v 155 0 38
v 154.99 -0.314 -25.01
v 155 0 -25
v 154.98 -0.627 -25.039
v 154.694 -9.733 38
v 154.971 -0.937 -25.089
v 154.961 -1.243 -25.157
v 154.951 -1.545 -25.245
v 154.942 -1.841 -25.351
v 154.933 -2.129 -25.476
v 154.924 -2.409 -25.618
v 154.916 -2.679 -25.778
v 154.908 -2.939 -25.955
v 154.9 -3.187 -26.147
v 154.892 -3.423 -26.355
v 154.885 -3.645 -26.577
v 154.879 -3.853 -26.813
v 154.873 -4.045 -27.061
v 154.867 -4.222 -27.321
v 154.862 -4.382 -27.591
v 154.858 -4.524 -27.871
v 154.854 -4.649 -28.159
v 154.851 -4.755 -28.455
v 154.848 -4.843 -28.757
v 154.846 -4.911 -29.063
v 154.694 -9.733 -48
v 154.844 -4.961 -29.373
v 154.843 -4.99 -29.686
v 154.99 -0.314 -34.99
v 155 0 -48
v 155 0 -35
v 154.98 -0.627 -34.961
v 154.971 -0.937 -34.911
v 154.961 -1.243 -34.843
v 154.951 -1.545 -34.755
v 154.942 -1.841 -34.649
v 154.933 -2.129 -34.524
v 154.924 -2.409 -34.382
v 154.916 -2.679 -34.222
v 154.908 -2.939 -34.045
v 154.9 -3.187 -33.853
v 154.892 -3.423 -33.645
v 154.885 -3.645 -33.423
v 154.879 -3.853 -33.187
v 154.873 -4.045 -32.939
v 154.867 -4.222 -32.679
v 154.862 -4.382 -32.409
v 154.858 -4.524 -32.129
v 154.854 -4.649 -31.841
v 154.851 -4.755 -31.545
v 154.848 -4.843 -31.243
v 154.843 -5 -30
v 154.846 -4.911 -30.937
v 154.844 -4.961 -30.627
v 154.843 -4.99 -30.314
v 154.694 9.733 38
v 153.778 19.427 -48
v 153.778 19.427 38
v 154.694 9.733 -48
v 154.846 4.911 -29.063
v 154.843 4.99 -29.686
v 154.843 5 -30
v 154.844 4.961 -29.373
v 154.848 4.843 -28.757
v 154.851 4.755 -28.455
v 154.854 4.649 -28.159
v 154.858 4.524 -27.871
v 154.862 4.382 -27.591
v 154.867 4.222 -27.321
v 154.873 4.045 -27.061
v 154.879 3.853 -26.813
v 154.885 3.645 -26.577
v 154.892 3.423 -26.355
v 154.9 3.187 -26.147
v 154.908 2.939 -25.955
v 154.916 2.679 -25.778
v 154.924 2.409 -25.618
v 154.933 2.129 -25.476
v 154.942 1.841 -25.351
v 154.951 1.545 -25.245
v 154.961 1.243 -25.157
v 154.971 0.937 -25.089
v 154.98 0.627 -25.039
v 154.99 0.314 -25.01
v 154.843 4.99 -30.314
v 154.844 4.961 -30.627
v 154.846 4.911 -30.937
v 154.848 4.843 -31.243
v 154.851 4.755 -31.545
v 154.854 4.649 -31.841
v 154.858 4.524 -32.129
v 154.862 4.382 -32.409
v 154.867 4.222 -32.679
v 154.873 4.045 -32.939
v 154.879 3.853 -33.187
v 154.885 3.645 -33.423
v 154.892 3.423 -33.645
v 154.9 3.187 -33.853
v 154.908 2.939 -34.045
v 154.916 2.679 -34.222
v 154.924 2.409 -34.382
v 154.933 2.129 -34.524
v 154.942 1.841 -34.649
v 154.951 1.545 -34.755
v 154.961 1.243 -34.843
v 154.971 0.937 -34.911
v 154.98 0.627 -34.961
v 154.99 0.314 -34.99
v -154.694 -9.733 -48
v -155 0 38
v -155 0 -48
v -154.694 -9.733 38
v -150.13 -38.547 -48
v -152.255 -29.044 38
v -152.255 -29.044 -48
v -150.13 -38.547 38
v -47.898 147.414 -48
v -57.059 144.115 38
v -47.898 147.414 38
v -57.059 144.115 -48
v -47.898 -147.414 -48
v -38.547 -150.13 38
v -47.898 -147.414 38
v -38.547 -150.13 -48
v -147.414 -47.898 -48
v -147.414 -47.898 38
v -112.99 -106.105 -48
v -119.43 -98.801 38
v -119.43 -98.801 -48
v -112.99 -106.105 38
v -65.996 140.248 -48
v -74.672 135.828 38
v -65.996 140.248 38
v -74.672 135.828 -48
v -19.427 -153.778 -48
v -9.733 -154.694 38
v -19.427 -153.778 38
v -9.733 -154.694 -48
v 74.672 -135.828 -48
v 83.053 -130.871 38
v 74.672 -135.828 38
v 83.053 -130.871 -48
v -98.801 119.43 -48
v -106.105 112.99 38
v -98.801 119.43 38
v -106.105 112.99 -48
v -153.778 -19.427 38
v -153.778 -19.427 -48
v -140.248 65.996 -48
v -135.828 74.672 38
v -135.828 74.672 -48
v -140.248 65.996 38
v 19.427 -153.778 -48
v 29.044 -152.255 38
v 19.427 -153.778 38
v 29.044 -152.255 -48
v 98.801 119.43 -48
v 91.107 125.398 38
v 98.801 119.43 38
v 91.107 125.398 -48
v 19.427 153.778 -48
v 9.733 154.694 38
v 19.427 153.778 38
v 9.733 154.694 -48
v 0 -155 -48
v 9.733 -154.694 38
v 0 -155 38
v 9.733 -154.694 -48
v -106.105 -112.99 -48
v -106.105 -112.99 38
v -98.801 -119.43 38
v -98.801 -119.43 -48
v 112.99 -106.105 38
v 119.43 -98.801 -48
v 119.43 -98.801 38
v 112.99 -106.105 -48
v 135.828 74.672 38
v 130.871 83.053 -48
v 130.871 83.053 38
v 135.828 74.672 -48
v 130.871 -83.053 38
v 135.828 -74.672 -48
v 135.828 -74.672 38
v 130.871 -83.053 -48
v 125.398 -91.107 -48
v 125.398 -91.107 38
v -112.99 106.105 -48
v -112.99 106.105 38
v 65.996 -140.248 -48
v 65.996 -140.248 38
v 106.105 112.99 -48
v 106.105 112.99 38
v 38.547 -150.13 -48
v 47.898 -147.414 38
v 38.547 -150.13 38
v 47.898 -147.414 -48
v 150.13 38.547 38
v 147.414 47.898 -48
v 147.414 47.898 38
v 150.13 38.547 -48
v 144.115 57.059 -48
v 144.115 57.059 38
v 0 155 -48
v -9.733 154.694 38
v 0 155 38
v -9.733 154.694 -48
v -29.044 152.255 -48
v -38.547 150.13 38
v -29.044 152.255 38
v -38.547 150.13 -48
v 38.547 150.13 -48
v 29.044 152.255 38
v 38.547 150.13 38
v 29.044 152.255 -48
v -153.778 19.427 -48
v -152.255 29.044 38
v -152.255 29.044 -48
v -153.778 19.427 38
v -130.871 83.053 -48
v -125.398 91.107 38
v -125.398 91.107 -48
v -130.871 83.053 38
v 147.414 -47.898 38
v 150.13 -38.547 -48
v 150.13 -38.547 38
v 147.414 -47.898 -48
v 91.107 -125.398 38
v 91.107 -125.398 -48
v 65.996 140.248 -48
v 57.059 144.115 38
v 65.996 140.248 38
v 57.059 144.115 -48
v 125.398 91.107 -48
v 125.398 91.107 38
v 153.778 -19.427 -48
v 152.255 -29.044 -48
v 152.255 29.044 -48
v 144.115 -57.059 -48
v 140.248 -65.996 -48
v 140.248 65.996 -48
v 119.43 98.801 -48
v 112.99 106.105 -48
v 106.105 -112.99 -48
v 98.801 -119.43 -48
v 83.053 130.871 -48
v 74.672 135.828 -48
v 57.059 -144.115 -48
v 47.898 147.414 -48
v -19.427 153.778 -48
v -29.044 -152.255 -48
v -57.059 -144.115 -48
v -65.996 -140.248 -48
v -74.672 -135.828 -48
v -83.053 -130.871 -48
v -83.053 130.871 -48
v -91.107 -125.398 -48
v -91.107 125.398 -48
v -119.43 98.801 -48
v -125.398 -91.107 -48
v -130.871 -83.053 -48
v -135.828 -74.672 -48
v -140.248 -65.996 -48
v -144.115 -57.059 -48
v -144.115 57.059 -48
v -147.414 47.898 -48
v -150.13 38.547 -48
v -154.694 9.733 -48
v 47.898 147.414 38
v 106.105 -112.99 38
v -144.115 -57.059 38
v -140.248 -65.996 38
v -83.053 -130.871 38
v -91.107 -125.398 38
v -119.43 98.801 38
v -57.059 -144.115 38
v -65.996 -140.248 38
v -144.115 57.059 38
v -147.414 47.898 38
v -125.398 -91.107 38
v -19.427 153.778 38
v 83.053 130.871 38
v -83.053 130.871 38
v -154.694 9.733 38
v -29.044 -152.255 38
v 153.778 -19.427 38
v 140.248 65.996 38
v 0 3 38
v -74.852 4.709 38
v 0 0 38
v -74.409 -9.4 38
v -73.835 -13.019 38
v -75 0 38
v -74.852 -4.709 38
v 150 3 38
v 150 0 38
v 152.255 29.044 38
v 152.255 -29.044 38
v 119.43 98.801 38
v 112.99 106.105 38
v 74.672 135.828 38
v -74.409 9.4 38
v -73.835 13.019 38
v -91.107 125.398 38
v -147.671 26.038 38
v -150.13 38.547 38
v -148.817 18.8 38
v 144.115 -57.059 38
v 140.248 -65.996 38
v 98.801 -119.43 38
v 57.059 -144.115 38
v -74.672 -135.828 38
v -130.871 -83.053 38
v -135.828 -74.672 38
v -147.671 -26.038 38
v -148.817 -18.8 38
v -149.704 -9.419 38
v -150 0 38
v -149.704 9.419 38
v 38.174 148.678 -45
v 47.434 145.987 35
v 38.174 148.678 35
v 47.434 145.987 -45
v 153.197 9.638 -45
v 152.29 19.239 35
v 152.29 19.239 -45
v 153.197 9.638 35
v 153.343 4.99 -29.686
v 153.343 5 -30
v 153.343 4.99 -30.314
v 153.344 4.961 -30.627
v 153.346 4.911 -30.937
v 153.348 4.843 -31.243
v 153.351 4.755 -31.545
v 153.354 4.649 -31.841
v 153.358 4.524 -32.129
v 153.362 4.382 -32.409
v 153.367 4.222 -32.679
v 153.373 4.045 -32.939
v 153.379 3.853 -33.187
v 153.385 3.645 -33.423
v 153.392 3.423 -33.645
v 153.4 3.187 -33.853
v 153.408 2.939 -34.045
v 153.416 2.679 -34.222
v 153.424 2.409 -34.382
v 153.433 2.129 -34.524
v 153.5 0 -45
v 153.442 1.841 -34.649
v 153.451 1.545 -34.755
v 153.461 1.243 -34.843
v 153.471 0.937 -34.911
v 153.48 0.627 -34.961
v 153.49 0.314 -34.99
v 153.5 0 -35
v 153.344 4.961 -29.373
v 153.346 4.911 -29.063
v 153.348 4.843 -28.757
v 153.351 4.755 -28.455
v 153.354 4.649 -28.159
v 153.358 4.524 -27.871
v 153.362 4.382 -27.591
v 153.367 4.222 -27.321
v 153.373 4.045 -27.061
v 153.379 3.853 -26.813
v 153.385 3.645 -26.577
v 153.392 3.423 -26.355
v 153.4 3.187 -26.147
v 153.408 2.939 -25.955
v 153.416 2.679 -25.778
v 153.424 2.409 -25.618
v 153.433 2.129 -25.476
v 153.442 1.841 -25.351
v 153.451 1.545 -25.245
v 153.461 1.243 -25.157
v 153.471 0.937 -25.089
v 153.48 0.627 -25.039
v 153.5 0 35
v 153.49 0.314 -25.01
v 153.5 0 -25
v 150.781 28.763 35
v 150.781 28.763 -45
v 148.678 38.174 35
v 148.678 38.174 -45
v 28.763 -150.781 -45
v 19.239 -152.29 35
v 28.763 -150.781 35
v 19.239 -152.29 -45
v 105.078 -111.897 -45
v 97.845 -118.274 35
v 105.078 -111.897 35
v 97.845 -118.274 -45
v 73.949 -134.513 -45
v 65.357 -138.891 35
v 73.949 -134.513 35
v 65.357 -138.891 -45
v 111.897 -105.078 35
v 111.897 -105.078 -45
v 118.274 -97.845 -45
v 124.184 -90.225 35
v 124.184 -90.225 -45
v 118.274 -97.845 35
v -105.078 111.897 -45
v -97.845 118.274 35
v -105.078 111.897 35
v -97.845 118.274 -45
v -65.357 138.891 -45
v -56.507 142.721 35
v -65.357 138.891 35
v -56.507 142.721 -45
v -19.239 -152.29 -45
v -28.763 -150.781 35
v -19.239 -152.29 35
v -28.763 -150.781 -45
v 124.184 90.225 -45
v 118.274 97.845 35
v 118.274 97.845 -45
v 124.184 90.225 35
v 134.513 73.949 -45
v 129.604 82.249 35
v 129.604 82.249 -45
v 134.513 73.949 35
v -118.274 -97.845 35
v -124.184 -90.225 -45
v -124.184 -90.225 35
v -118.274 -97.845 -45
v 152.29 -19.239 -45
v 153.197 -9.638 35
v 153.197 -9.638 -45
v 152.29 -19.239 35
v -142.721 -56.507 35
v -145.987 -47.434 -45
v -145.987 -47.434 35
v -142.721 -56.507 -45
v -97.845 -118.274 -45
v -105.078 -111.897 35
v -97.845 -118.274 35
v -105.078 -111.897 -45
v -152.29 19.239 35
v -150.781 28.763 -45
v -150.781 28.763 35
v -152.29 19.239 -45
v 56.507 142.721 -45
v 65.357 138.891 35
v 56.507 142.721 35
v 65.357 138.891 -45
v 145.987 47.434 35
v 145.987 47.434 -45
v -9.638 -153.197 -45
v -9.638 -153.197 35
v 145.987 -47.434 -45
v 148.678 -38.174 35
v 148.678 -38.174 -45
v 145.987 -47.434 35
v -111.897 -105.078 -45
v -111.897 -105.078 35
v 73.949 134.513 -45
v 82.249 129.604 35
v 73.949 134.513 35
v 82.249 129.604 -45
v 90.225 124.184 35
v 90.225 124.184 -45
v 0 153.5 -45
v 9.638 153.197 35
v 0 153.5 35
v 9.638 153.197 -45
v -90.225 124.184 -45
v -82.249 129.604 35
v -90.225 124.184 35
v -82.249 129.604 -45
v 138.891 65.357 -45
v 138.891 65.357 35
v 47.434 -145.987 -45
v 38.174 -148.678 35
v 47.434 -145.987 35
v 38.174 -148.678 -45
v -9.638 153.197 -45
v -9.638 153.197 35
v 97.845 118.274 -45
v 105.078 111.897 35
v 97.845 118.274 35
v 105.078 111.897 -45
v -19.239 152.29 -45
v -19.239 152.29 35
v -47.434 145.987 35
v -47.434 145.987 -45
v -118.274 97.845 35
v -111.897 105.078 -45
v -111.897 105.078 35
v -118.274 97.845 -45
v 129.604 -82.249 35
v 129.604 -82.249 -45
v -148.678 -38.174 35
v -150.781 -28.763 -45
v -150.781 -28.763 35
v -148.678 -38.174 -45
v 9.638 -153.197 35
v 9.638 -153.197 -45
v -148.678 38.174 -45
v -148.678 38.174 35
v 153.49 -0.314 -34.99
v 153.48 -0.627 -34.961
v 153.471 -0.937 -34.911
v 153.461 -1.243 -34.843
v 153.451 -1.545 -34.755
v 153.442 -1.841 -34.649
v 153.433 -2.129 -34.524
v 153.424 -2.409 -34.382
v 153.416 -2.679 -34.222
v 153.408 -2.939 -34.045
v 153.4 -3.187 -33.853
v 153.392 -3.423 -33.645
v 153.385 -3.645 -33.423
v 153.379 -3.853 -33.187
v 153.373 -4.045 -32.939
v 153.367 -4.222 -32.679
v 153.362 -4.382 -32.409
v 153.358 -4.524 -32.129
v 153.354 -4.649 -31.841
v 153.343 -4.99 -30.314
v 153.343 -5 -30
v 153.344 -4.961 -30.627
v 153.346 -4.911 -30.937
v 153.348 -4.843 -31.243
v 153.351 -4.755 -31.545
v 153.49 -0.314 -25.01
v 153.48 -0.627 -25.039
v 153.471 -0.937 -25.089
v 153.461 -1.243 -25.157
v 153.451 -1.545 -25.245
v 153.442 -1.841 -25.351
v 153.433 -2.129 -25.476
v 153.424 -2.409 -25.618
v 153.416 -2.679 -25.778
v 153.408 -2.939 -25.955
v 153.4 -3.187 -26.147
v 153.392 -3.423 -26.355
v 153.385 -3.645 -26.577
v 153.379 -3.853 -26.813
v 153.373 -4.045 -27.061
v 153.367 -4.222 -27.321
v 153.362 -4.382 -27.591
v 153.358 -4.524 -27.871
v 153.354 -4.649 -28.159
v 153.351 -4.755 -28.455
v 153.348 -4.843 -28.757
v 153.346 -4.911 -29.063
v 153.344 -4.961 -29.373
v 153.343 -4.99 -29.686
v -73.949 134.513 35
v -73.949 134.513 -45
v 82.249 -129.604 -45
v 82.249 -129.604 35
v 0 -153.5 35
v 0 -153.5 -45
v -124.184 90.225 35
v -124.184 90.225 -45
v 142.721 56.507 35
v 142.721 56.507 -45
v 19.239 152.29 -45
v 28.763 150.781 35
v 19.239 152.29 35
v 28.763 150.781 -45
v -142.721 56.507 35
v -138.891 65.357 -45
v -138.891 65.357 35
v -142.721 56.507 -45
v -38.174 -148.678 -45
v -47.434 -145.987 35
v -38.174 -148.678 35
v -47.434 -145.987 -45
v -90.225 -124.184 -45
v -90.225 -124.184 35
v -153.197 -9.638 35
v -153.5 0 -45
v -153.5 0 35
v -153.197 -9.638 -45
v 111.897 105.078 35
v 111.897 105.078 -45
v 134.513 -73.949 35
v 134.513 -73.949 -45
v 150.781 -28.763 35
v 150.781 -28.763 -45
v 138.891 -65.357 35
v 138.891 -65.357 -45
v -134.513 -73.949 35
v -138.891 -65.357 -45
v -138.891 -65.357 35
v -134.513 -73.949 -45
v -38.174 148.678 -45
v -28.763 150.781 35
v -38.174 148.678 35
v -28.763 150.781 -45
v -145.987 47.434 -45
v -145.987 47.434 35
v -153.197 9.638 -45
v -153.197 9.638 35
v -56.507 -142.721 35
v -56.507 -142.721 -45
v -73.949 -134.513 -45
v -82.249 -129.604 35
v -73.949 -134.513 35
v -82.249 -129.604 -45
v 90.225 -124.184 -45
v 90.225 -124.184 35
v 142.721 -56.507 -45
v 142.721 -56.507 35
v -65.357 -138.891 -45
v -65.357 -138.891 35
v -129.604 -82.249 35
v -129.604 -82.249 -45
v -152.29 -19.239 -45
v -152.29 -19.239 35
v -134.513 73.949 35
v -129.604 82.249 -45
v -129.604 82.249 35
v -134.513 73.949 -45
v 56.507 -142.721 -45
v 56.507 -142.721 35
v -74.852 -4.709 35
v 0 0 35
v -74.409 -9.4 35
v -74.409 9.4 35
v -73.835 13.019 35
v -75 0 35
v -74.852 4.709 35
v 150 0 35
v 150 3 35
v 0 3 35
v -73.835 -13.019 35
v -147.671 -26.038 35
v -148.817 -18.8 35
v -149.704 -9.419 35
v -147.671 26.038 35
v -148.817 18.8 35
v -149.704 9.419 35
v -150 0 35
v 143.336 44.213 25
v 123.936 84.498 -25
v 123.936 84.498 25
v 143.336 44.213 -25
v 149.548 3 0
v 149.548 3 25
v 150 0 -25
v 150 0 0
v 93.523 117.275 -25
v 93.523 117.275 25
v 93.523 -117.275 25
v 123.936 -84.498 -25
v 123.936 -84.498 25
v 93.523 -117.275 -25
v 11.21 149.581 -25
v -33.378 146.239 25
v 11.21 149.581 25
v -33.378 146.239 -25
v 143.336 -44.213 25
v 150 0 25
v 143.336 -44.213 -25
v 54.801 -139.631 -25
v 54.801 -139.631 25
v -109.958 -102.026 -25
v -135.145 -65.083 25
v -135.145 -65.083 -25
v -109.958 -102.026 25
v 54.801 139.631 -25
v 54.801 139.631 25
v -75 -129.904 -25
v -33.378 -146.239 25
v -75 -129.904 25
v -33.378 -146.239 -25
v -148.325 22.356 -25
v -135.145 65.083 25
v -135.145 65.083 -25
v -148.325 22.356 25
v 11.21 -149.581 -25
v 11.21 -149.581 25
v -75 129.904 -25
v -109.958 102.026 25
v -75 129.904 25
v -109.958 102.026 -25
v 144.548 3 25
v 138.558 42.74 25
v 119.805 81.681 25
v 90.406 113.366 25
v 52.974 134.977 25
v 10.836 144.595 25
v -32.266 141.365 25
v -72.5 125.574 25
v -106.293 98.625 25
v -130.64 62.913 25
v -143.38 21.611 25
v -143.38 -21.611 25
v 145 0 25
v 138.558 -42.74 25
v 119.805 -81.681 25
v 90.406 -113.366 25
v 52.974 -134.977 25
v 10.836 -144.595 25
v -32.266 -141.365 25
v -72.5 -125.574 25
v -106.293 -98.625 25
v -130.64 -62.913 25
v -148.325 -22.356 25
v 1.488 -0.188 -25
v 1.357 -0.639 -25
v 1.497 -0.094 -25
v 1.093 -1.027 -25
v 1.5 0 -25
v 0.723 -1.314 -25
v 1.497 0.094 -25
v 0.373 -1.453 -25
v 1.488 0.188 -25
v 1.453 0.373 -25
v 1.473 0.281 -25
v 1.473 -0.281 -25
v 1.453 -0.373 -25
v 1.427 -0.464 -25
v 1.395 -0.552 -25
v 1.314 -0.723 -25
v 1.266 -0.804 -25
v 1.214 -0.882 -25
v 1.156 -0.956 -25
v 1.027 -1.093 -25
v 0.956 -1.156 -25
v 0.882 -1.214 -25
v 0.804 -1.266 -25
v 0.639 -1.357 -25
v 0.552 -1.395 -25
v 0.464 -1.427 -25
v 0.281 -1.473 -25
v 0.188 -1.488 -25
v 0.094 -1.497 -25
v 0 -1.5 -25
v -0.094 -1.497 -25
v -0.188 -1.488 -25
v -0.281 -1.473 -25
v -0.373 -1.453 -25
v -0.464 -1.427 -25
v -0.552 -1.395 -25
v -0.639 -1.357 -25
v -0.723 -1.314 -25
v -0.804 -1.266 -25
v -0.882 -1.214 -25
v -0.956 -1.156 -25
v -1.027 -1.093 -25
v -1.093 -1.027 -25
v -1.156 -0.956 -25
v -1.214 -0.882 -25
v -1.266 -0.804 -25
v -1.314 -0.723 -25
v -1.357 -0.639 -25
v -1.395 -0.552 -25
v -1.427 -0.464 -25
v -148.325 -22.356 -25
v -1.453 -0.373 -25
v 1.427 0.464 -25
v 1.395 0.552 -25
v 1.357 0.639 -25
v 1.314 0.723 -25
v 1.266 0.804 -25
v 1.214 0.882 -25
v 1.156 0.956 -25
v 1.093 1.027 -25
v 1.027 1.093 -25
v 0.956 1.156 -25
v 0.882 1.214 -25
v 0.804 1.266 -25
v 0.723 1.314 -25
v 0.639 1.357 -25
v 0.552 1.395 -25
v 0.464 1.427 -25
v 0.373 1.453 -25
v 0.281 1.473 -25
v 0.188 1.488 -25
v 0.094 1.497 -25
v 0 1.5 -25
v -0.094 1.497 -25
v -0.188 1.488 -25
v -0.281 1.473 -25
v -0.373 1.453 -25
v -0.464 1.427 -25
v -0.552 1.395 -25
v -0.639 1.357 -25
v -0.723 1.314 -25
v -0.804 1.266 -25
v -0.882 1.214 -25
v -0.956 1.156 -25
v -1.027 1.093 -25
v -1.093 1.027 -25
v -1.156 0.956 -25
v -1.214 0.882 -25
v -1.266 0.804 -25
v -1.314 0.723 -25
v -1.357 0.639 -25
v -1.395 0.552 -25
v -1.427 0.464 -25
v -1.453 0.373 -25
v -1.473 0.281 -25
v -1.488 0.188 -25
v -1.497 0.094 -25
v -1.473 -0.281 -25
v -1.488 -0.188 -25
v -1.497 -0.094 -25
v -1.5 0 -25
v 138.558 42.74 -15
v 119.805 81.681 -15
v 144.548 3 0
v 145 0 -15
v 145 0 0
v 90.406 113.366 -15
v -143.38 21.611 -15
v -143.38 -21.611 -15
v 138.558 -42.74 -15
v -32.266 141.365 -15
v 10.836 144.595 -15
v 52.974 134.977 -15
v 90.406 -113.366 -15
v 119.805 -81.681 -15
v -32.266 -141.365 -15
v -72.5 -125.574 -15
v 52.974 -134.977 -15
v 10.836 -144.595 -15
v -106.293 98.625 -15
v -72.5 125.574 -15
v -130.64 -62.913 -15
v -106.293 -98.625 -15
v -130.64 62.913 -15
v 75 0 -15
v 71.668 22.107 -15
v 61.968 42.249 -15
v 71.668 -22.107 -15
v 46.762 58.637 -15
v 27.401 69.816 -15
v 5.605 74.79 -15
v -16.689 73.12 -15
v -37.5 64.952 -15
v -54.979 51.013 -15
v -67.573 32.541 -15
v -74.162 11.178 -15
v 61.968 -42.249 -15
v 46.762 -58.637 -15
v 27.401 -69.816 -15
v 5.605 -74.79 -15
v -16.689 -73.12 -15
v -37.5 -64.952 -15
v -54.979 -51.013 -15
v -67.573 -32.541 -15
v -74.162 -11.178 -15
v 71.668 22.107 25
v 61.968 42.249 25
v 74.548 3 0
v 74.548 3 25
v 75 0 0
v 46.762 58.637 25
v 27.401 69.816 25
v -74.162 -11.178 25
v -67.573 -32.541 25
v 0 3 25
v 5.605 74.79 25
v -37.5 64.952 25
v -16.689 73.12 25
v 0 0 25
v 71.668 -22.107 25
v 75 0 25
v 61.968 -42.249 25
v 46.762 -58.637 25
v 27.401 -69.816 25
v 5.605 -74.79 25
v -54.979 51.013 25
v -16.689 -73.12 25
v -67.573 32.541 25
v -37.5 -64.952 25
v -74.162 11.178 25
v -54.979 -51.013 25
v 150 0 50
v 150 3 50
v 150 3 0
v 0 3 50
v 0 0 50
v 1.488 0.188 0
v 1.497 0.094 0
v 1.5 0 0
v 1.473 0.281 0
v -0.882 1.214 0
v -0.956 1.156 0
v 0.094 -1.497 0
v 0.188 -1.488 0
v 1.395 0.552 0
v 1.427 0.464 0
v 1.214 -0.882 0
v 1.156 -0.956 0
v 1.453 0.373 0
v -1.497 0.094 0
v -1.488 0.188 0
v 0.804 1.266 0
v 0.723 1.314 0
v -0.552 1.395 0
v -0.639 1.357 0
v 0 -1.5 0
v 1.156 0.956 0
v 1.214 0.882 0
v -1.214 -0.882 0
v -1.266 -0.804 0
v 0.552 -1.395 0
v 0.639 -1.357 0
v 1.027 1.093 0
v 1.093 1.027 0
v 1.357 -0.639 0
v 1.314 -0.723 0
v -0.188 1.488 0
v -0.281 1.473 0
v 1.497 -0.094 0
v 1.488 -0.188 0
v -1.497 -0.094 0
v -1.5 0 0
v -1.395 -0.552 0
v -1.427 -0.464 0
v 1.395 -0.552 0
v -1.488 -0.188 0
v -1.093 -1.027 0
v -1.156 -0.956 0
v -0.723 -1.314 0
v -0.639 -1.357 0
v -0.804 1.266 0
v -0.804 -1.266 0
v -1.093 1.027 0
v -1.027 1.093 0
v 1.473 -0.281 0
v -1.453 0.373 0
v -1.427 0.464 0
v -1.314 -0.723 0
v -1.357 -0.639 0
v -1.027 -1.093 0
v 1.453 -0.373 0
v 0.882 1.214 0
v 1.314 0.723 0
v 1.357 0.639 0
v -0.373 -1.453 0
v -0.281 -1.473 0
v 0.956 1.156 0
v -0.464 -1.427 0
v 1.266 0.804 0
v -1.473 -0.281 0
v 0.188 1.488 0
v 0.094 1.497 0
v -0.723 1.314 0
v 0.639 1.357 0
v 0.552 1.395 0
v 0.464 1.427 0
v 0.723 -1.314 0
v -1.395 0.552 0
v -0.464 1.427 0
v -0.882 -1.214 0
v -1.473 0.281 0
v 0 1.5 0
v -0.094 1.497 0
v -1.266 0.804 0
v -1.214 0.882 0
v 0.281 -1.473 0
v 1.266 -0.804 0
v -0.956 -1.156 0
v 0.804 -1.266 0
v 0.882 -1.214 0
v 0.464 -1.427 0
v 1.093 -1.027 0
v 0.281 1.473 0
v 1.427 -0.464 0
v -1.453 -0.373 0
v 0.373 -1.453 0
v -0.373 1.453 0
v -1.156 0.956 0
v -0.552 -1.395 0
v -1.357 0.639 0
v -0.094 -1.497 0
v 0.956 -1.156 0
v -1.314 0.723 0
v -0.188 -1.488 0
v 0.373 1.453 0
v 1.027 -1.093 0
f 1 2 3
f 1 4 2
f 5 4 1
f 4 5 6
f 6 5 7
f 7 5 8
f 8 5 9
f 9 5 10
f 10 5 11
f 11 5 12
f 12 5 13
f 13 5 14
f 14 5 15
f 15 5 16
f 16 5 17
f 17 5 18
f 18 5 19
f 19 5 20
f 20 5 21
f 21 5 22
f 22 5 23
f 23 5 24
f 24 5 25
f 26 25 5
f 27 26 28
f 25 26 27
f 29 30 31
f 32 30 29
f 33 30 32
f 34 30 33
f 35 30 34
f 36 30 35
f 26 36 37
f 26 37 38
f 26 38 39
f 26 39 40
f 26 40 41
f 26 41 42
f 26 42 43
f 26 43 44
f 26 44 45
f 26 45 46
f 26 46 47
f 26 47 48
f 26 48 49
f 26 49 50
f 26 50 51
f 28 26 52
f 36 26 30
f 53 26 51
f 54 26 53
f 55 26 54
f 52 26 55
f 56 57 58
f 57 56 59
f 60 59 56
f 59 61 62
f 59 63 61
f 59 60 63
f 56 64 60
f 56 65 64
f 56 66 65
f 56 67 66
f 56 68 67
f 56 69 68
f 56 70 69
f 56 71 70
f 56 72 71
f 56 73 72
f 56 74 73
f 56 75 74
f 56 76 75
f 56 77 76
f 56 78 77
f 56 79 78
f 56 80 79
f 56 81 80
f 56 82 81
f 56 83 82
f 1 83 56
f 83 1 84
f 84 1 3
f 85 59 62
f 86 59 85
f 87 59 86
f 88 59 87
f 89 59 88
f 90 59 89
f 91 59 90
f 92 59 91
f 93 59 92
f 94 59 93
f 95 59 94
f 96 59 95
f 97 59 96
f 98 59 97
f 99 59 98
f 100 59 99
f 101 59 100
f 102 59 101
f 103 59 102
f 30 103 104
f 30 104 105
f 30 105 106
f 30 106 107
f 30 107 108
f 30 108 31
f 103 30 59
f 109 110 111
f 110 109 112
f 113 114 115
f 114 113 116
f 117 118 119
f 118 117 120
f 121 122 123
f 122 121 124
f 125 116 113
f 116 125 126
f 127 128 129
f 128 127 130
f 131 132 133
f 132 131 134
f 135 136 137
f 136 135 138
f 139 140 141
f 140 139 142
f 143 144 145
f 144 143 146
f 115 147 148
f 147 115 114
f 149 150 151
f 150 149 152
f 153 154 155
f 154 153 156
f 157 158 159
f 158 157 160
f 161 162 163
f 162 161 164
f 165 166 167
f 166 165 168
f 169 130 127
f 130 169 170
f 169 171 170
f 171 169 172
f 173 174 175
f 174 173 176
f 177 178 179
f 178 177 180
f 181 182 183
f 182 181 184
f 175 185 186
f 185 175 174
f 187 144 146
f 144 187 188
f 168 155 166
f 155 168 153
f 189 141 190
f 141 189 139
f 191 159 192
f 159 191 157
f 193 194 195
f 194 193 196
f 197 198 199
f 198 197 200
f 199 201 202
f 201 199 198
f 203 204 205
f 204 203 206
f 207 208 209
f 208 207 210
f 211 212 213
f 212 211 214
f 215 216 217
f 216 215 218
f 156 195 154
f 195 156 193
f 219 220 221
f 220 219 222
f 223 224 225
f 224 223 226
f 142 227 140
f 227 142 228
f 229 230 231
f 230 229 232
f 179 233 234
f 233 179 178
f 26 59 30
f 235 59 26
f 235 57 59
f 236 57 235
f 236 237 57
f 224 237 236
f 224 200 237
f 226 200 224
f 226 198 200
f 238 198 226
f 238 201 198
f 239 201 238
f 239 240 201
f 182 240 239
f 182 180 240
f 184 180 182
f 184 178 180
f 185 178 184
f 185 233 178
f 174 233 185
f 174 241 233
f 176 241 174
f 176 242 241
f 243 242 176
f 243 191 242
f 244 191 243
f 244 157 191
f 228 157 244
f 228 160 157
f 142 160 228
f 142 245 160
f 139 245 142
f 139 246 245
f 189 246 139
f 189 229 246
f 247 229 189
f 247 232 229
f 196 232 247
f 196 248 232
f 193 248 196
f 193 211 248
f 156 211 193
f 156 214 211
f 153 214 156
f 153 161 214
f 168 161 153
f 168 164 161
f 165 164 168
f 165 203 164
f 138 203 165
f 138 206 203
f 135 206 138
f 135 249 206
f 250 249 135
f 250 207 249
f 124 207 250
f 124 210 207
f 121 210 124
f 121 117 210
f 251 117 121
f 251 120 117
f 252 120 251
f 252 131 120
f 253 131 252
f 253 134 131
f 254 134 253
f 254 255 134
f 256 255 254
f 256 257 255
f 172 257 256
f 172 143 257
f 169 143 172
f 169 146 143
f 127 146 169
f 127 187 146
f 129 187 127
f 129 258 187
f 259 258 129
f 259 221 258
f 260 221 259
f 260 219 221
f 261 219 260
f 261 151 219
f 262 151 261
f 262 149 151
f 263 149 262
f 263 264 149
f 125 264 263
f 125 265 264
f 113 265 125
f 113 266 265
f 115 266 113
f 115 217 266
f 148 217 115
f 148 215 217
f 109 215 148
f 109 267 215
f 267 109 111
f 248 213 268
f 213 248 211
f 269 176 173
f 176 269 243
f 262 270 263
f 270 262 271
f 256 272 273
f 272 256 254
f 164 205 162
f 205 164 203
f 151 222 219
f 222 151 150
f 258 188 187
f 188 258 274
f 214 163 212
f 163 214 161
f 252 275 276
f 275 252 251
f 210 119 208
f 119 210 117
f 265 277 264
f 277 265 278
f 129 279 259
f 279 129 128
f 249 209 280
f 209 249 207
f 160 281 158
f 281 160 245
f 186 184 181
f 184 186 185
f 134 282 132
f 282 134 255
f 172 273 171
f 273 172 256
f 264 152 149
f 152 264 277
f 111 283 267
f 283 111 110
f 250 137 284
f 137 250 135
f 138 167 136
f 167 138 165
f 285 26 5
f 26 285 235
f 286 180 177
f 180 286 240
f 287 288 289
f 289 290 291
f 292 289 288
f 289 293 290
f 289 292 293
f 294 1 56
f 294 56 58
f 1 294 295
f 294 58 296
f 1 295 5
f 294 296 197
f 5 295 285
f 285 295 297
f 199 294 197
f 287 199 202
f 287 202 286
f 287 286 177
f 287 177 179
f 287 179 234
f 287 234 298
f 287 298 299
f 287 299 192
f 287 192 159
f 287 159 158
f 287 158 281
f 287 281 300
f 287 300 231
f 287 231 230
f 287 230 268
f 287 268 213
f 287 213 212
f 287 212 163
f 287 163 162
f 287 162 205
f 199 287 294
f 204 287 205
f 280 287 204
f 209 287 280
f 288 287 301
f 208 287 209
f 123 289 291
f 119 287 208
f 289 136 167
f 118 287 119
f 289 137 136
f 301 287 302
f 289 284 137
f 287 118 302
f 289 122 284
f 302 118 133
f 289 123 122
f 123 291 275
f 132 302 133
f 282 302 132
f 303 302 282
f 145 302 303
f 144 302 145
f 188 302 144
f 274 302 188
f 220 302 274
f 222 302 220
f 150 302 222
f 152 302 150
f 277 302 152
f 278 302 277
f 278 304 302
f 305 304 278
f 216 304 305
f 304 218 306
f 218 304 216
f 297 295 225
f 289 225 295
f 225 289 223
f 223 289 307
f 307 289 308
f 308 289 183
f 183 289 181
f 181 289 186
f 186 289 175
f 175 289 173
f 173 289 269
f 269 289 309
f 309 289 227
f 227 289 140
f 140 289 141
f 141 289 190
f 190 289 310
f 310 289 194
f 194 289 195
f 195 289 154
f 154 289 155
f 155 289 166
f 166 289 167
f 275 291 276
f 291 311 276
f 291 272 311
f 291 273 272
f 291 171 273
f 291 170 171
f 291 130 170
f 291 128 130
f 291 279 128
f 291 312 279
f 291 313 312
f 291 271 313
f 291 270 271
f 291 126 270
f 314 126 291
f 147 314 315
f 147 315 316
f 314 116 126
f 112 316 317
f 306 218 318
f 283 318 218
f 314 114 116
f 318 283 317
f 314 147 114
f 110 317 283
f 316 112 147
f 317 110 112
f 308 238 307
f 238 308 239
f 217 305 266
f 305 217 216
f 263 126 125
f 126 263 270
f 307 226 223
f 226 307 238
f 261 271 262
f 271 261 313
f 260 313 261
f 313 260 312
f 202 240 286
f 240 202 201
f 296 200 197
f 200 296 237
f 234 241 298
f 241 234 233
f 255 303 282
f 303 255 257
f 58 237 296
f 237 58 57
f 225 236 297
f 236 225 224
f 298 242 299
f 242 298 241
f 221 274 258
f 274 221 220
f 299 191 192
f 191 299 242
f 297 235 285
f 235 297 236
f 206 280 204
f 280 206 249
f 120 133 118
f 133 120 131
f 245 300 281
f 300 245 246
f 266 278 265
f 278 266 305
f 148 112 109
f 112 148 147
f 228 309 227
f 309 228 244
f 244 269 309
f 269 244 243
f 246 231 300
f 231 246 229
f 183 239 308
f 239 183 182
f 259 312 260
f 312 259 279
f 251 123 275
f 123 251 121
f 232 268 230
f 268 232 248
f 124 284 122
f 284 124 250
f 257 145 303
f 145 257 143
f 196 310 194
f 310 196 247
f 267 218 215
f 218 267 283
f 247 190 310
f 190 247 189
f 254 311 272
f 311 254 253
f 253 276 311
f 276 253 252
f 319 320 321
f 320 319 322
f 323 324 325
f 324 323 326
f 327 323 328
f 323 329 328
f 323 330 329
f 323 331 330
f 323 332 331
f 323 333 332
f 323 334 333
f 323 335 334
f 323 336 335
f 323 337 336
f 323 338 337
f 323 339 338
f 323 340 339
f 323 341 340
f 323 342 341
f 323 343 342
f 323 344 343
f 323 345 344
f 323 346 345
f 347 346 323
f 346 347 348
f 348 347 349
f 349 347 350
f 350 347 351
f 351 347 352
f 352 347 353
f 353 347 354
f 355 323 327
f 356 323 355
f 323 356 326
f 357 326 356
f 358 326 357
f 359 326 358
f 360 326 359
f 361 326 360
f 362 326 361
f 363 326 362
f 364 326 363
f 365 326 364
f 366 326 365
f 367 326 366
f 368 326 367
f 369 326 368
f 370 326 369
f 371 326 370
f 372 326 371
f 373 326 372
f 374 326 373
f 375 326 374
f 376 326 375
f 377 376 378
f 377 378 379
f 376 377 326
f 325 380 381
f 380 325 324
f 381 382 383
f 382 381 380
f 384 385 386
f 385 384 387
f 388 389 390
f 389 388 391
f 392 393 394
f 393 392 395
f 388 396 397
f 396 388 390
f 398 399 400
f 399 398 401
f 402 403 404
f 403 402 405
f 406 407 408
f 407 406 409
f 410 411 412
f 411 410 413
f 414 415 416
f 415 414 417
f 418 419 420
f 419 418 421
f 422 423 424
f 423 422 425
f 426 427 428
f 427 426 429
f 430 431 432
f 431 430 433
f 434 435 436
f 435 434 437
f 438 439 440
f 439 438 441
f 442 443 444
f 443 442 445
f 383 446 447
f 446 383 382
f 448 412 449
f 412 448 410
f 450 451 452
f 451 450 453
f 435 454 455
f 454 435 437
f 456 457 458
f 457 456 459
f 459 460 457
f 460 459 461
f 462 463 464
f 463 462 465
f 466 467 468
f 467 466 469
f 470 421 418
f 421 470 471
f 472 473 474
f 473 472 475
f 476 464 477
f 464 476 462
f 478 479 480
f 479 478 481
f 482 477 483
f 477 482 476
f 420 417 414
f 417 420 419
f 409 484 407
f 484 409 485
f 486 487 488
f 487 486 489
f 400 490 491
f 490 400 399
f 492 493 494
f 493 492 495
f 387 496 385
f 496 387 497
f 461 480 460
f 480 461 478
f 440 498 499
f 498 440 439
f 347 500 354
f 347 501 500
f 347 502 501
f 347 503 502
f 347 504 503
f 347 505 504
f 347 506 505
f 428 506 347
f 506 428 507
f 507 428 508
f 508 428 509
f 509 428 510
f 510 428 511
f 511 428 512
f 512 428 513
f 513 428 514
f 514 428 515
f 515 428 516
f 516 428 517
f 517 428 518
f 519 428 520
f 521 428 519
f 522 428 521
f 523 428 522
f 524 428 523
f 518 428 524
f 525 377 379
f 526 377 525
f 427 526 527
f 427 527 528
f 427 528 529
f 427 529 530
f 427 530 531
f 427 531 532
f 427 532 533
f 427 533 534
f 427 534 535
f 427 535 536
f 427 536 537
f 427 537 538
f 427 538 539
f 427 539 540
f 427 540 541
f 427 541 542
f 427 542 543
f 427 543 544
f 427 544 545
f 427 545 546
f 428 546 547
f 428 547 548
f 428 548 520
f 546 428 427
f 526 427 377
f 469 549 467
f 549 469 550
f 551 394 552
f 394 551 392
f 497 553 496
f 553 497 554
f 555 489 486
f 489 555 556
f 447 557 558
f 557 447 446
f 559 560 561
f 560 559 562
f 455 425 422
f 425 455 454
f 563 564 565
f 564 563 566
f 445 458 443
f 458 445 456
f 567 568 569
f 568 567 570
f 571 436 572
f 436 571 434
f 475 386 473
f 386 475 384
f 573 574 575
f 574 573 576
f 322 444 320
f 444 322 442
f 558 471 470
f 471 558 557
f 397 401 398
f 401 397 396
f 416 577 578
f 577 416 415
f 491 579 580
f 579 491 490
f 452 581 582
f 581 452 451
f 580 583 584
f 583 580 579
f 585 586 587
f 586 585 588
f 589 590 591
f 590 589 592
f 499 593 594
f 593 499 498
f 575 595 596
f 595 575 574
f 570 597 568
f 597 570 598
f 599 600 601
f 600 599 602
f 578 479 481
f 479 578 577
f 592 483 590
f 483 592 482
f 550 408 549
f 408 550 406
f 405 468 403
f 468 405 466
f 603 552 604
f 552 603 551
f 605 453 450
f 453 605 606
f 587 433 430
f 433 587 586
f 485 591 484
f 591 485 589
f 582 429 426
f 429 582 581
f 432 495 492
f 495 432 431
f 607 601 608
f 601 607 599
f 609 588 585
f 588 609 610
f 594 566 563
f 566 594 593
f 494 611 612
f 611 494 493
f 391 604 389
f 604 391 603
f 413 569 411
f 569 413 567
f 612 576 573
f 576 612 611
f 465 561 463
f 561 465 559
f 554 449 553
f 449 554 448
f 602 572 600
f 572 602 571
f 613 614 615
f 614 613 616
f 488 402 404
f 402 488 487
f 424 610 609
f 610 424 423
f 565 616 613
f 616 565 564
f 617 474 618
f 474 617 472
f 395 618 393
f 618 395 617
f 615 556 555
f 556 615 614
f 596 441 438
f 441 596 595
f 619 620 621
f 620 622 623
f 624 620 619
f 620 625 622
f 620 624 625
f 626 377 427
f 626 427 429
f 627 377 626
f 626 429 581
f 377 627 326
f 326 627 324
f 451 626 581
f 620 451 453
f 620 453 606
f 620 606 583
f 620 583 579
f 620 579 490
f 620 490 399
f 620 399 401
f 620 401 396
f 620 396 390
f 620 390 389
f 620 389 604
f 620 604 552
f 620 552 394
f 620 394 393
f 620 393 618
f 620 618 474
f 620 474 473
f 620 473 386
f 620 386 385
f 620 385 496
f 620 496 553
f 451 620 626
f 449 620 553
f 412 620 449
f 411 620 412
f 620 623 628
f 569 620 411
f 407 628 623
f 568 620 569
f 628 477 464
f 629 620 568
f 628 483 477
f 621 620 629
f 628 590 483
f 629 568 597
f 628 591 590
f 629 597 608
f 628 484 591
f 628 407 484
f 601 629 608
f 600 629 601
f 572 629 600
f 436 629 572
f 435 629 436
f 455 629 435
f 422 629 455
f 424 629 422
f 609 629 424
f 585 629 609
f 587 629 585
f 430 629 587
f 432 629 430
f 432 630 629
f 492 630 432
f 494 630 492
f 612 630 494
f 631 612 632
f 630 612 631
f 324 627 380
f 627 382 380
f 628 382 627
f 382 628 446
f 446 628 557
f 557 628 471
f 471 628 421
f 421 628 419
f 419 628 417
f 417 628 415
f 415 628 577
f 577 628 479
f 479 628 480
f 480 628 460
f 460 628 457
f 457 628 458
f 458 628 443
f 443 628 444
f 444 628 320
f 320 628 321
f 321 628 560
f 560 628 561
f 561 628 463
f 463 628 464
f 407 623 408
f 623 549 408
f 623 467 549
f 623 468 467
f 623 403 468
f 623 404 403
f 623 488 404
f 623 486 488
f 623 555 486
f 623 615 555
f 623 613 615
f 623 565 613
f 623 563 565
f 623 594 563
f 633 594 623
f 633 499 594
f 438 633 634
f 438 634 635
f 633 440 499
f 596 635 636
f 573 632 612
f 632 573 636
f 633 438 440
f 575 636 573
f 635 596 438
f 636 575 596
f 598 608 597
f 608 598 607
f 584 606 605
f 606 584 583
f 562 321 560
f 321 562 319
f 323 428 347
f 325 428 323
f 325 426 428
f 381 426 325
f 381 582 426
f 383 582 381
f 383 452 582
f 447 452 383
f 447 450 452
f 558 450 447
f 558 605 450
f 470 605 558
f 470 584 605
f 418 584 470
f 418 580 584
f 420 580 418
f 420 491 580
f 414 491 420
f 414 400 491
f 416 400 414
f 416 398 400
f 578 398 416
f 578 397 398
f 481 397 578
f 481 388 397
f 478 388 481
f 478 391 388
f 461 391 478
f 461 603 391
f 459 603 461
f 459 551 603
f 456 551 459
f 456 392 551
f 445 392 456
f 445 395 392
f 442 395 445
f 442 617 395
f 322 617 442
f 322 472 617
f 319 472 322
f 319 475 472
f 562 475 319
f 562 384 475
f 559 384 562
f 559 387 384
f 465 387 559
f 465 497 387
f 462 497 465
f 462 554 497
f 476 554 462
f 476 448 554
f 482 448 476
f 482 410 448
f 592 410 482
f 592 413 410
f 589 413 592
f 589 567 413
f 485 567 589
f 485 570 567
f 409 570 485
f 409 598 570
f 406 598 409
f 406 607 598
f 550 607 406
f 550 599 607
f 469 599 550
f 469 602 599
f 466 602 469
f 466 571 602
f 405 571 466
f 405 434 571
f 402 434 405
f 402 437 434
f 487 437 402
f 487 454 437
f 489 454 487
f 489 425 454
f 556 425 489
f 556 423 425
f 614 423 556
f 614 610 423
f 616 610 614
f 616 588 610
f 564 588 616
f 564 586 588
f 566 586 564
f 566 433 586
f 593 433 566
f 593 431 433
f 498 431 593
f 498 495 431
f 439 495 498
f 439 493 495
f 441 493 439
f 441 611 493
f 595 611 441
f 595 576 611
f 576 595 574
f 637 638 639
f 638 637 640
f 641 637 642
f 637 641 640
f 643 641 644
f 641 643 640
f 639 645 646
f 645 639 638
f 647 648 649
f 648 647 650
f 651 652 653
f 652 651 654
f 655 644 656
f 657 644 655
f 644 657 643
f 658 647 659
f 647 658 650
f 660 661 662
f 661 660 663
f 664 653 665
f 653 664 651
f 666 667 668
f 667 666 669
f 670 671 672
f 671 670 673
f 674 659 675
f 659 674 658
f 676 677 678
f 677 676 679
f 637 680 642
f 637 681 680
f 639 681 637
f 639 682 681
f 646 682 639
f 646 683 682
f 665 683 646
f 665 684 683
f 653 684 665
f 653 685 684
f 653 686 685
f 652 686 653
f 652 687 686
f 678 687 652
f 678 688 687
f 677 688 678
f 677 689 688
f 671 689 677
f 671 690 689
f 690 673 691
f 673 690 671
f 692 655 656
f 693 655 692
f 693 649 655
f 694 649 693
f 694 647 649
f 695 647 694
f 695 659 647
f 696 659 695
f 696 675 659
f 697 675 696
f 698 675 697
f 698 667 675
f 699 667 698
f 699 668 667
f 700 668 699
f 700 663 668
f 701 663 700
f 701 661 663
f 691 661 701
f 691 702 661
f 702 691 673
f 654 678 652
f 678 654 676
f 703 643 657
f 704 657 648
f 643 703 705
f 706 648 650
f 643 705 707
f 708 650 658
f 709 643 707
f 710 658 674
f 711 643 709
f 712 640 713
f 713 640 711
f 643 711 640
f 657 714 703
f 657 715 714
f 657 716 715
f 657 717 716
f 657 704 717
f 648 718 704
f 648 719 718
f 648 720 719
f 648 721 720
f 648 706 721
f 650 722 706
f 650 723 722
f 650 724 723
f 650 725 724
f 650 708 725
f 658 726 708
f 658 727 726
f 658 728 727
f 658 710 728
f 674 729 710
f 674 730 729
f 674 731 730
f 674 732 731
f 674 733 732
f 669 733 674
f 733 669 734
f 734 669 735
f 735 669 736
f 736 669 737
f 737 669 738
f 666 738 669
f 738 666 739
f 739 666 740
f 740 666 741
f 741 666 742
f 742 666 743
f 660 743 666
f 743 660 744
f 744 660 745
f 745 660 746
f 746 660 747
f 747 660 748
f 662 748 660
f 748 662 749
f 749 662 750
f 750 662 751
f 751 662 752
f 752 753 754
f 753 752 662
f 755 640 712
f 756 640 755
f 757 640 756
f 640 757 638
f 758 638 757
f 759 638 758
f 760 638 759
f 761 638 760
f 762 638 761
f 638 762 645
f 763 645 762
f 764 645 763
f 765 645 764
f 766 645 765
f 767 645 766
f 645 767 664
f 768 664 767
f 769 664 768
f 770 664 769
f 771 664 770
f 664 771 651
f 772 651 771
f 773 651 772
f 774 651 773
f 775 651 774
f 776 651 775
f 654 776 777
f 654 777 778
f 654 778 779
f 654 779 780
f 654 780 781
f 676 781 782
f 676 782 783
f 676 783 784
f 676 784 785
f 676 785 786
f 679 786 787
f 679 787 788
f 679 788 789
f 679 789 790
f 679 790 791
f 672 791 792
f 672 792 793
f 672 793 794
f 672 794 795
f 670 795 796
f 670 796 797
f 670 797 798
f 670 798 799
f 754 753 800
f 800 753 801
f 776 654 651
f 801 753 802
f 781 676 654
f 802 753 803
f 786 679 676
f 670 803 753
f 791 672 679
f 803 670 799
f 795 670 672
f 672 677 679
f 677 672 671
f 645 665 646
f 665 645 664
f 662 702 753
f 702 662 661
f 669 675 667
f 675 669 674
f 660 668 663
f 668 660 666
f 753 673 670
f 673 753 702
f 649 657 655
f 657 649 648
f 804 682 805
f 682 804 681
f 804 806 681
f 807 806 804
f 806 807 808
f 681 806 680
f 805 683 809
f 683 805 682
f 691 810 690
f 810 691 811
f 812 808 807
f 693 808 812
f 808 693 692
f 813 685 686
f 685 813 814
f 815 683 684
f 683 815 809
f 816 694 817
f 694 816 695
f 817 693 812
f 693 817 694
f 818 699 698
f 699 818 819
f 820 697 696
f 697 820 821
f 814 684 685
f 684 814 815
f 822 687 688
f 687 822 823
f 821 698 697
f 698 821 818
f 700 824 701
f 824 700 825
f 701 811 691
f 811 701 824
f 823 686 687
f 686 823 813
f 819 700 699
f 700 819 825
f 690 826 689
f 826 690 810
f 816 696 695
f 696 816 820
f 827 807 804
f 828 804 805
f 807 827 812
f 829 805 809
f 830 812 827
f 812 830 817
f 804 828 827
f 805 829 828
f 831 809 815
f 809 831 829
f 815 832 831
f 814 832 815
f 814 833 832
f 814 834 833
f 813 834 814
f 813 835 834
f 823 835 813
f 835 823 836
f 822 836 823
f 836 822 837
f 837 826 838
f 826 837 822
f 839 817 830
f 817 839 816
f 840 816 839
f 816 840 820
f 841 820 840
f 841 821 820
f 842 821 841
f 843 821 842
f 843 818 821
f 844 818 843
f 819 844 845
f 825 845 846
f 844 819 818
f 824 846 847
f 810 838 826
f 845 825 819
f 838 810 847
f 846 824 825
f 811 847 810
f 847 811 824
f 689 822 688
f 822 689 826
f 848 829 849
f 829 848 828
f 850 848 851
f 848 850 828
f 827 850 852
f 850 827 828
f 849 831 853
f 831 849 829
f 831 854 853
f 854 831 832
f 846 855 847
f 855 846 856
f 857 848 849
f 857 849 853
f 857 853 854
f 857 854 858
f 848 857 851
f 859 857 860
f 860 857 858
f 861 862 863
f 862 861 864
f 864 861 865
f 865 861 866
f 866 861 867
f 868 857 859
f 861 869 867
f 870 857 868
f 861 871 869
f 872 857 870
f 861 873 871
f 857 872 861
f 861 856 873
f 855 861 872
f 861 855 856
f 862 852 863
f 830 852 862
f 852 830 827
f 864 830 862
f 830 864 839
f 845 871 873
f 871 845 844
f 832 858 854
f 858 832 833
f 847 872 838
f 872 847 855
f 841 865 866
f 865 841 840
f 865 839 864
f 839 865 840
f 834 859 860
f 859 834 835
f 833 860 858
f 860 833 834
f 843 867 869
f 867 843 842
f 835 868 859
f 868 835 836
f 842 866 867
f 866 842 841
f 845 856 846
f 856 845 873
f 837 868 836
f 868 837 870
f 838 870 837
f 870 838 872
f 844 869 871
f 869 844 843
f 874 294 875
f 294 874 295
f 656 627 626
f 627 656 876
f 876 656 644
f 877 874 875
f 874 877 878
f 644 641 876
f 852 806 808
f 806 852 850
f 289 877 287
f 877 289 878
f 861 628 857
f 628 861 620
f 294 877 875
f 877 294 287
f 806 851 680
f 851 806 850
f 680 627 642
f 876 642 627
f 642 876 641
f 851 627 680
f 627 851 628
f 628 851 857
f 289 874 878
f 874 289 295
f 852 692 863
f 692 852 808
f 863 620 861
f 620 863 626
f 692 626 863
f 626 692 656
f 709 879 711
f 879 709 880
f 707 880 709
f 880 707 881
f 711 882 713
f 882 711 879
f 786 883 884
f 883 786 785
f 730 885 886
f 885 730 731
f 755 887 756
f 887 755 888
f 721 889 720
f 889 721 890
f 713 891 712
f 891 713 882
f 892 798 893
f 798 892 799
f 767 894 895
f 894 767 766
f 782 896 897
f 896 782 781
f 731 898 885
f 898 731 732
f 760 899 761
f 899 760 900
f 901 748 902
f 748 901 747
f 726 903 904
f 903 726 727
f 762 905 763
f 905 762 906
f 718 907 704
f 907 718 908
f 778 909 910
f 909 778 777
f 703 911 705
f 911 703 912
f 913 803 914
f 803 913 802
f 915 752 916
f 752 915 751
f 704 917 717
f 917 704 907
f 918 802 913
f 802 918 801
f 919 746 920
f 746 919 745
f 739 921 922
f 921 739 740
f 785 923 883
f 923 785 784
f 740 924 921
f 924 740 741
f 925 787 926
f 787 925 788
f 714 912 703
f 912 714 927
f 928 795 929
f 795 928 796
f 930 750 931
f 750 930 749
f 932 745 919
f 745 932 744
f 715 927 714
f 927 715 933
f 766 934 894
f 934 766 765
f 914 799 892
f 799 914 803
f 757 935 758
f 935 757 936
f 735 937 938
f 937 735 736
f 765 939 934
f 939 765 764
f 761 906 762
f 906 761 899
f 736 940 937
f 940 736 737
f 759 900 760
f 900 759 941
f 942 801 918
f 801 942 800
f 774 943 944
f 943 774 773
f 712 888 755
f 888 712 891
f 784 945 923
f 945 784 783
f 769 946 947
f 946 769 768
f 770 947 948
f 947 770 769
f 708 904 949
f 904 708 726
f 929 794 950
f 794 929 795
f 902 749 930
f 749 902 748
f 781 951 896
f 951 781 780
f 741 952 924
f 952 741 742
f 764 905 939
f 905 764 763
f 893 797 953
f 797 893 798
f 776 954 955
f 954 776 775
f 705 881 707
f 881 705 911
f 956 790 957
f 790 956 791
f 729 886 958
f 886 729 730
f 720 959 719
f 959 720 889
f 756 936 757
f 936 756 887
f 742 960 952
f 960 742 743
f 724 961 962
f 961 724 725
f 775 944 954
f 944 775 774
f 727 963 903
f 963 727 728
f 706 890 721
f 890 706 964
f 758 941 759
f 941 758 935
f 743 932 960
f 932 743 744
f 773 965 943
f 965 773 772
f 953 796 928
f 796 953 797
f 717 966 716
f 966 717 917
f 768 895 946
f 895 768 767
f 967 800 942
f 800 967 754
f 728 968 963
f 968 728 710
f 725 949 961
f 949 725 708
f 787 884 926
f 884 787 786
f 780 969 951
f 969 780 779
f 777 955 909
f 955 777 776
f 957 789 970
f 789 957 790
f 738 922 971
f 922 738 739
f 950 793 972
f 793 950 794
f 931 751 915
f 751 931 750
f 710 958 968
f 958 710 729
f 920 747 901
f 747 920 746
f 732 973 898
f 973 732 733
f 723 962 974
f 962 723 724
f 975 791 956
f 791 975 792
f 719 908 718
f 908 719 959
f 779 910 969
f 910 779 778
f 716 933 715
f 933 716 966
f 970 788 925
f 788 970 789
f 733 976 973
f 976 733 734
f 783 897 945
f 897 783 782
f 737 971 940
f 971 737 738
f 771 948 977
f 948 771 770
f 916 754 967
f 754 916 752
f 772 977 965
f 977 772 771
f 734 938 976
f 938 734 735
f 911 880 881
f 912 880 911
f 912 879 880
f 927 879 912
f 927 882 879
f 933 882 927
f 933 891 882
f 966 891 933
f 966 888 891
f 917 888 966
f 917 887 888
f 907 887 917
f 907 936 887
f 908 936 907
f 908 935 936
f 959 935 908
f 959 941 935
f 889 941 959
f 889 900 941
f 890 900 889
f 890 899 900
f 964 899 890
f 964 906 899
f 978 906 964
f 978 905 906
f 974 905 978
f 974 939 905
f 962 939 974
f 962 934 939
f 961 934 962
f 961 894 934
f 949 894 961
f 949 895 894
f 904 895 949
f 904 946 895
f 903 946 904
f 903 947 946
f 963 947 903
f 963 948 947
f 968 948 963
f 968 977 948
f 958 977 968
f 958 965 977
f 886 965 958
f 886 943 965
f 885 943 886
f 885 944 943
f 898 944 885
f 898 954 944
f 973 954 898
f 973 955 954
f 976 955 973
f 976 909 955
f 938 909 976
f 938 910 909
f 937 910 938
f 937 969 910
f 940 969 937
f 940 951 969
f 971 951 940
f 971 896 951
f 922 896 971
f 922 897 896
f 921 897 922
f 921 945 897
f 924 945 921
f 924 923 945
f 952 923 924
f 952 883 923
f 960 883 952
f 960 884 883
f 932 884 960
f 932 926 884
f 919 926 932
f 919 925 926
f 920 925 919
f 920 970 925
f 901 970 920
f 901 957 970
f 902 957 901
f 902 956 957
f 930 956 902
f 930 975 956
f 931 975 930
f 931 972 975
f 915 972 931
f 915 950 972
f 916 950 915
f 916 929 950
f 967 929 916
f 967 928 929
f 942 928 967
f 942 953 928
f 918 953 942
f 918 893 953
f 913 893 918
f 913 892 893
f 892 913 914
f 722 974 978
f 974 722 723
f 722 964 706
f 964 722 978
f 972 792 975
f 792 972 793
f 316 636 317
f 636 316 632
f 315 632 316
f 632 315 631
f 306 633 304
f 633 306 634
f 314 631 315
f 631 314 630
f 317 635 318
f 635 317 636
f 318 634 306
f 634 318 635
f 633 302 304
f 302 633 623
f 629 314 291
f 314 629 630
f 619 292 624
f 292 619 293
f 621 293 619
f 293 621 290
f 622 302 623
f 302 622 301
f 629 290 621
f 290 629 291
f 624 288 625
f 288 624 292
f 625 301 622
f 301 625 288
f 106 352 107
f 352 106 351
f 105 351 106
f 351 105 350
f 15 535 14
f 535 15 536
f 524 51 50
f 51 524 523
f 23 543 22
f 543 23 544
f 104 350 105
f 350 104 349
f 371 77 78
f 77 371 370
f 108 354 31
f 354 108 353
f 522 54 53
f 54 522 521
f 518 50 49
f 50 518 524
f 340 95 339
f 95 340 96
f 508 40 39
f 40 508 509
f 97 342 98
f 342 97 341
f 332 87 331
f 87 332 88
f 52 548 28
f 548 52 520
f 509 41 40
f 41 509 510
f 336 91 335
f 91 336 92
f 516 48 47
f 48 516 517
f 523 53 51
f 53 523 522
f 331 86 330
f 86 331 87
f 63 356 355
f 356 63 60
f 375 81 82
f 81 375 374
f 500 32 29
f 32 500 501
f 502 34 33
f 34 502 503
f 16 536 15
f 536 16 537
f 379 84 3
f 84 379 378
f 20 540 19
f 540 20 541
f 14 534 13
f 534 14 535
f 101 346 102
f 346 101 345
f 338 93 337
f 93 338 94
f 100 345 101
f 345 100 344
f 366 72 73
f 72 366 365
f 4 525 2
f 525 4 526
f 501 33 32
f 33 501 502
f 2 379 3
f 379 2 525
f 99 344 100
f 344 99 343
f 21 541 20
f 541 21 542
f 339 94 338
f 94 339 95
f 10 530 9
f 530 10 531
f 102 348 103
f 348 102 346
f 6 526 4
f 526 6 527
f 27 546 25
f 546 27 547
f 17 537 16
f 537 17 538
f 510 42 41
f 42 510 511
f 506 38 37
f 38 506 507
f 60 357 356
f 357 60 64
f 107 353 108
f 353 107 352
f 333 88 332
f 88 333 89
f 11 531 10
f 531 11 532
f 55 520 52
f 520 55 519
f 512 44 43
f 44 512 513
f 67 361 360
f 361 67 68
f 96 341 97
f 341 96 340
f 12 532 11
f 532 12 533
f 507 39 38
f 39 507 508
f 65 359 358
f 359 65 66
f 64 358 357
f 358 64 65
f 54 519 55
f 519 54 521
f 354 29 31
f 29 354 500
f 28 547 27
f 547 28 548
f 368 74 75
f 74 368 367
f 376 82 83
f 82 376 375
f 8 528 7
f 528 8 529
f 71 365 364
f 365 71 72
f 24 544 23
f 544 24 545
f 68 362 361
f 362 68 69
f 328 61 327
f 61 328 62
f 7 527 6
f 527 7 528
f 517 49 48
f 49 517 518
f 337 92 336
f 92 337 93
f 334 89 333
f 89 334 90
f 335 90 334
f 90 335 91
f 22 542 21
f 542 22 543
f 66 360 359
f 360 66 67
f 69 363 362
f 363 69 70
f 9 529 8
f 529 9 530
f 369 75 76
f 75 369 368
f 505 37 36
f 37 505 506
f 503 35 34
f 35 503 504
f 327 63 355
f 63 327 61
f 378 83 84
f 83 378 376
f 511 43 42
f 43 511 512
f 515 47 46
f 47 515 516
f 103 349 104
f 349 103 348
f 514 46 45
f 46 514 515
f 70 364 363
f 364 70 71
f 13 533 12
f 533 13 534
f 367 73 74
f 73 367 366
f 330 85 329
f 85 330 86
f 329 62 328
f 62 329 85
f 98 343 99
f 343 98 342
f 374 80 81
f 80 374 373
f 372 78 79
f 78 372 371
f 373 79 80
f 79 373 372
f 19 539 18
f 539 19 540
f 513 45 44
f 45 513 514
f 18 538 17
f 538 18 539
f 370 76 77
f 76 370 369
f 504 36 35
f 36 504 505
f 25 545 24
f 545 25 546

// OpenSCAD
// file: sector.scad
translate([0,0,0]) sector(30, 20, 10, 90);
translate([22,0,0]) sector(30, 20, 300, 30);
translate([0,22,0]) sector(30, 20, 30, 300);
translate([22,22,0]) sector(30, 20, 10, 190);

module sector(h, d, a1, a2) {
    if (a2 - a1 > 180) {
        difference() {
            cylinder(h=h, d=d);
            translate([0,0,-0.5]) sector(h+1, d+1, a2-360, a1); 
        }
    } else {
        difference() {
            cylinder(h=h, d=d);
            rotate([0,0,a1]) translate([-d/2, -d/2, -0.5])
                cube([d, d/2, h+1]);
            rotate([0,0,a2]) translate([-d/2, 0, -0.5])
                cube([d, d/2, h+1]);
        }
    }
}    
// main file
//ESTE MODULO GENERA UNA CAJA PARA EL PASTILLERO.

use<sector.scad>;
//la caja central para las patillas.
module cajasinhueco (tomasdia=3,
altura=50,
diametro=300,
diametrointerior=150,
grosorlateral=10,
grosorlateralcarcasa=10,
grosorinferiorcarcasa=5,
grosorsuperiorcarcasa=5,
grosorinferior=10,
grosorcajon=3
){

tomassem=tomasdia*7;
angulo=360/tomassem/2;
anguloinic=(tomasdia%2!=0)? angulo: 0;   

module cajitas(
tomasdia=3,
altura=50,
diametro=300,
diametrointerior=150
){
//for(n = [anguloinic : 2*angulo : 360]){    
   echo(0);
   difference(){
        rotate([0,0,0])
        cube([diametro-diametrointerior,grosorcajon,altura]);
        //rotate([0,0,0])
        //translate([diametro/2-grosorlateral,0,0])
        //cube([diametro-grosorlateral,grosorcajon,altura],center=true);
    }
//}
}
difference(){
    cylinder(h=altura,d=diametro,$fn=tomassem, center=true);
    translate([0,0,grosorinferior]){   
    cylinder(h=altura,d=diametro-grosorlateral,$fn=tomassem, center=true);
    }    
}
cylinder(h=altura,d=diametrointerior,$fn=tomassem, center=true);
       cajitas();
}
//la caja, teniendo en cuenta el agujero para el servomotor.
module caja(tomasdia=3,
altura=50,
diametro=300,
diametrointerior=150,
grosorlateral=10,
grosorlateralcarcasa=10,
grosorinferiorcarcasa=5,
grosorsuperiorcarcasa=5,
grosorinferior=10,
grosorcajon=3){

difference(){
    cajasinhueco(tomasdia,
altura,
diametro,
diametrointerior,
grosorlateral,
grosorlateralcarcasa,
grosorinferiorcarcasa,
grosorsuperiorcarcasa,
grosorinferior,
grosorcajon);
    translate([0,0,-25]){
        cylinder(h=50, d=3, $fn=100, center=true);
    }
}
}
//La caja y la cubierta exterior
module cajacubierta(tomasdia=3,
altura=50,
diametro=300,
diametrointerior=150,
grosorlateral=10,
grosorlateralcarcasa=10,
grosorinferiorcarcasa=5,
grosorsuperiorcarcasa=5,
grosorinferior=10,
grosorcajon=3,
hsup=10,
hinf=20,
hlat=7,
gsup=3,
ginf=3,
glat=3
){  
    alturacajaExt=altura+hsup+gsup+hinf+ginf;
    alturacajaInt=altura+hsup+hinf;
    desplazamiento=hinf-(alturacajaInt-altura)/2;
    translate([0,0,-desplazamiento]){
    difference(){  
        cylinder(h=alturacajaExt, d=diametro+hlat+glat, $fn=100, center=true);
        cylinder(h=alturacajaInt,d=diametro+hlat, $fn=100, center=true);    
    }
    } 
caja(tomasdia,
altura,
diametro,
diametrointerior,
grosorlateral,
grosorlateralcarcasa,
grosorinferiorcarcasa,
grosorsuperiorcarcasa,
grosorinferior,
grosorcajon);
}
//%cajacubierta();
//Caja con una apertura para coger la pastilla y con un agujero para la alimentación 
module cajaAlimTapa(tomasdia=3,
altura=50,
diametro=300,
diametrointerior=150,
grosorlateral=10,
grosorlateralcarcasa=10,
grosorinferiorcarcasa=5,
grosorsuperiorcarcasa=5,
grosorinferior=10,
grosorcajon=3,
hsup=10,
hinf=20,
hlat=7,
gsup=3,
ginf=3,
glat=3,
anguloTapa1=170,
anguloTapa2=190,
diametroalim=10,
alturaalim=10
){
  module tapa(){
   difference(){
    translate([0,0,altura*0.5+hsup]){
    sector(h=gsup, d=diametro, a1=anguloTapa1, a2=anguloTapa2,$fn=100, centre=true);   
    }    
    translate([0,0,altura*0.5+hsup]){
    sector(h=gsup, d=diametrointerior, a1=anguloTapa1, a2=anguloTapa2, $fn=100, centre=true);
   }     
}
}
    alturacajaInt=altura+hsup+hinf;
    desplazamientoAlim=alturacajaInt/2-alturaalim;
    echo(alturacajaInt/2);
    echo(desplazamientoAlim);
    
difference(){
            cajacubierta(tomasdia,
            altura,
            diametro,
            diametrointerior,
            grosorlateral,
            grosorlateralcarcasa,
            grosorinferiorcarcasa,
            grosorsuperiorcarcasa,
            grosorinferior,
            grosorcajon,
            hsup,
            hinf,
            hlat,
            gsup,
            ginf,
            glat
            );
            translate([(diametro+hlat/2)/2,0, -desplazamientoAlim])
            rotate(a=[0,90,0])
            cylinder(h=glat*2, d=diametroalim, $fn=100, centre=true); 
            tapa();
}
}
cajaAlimTapa();
